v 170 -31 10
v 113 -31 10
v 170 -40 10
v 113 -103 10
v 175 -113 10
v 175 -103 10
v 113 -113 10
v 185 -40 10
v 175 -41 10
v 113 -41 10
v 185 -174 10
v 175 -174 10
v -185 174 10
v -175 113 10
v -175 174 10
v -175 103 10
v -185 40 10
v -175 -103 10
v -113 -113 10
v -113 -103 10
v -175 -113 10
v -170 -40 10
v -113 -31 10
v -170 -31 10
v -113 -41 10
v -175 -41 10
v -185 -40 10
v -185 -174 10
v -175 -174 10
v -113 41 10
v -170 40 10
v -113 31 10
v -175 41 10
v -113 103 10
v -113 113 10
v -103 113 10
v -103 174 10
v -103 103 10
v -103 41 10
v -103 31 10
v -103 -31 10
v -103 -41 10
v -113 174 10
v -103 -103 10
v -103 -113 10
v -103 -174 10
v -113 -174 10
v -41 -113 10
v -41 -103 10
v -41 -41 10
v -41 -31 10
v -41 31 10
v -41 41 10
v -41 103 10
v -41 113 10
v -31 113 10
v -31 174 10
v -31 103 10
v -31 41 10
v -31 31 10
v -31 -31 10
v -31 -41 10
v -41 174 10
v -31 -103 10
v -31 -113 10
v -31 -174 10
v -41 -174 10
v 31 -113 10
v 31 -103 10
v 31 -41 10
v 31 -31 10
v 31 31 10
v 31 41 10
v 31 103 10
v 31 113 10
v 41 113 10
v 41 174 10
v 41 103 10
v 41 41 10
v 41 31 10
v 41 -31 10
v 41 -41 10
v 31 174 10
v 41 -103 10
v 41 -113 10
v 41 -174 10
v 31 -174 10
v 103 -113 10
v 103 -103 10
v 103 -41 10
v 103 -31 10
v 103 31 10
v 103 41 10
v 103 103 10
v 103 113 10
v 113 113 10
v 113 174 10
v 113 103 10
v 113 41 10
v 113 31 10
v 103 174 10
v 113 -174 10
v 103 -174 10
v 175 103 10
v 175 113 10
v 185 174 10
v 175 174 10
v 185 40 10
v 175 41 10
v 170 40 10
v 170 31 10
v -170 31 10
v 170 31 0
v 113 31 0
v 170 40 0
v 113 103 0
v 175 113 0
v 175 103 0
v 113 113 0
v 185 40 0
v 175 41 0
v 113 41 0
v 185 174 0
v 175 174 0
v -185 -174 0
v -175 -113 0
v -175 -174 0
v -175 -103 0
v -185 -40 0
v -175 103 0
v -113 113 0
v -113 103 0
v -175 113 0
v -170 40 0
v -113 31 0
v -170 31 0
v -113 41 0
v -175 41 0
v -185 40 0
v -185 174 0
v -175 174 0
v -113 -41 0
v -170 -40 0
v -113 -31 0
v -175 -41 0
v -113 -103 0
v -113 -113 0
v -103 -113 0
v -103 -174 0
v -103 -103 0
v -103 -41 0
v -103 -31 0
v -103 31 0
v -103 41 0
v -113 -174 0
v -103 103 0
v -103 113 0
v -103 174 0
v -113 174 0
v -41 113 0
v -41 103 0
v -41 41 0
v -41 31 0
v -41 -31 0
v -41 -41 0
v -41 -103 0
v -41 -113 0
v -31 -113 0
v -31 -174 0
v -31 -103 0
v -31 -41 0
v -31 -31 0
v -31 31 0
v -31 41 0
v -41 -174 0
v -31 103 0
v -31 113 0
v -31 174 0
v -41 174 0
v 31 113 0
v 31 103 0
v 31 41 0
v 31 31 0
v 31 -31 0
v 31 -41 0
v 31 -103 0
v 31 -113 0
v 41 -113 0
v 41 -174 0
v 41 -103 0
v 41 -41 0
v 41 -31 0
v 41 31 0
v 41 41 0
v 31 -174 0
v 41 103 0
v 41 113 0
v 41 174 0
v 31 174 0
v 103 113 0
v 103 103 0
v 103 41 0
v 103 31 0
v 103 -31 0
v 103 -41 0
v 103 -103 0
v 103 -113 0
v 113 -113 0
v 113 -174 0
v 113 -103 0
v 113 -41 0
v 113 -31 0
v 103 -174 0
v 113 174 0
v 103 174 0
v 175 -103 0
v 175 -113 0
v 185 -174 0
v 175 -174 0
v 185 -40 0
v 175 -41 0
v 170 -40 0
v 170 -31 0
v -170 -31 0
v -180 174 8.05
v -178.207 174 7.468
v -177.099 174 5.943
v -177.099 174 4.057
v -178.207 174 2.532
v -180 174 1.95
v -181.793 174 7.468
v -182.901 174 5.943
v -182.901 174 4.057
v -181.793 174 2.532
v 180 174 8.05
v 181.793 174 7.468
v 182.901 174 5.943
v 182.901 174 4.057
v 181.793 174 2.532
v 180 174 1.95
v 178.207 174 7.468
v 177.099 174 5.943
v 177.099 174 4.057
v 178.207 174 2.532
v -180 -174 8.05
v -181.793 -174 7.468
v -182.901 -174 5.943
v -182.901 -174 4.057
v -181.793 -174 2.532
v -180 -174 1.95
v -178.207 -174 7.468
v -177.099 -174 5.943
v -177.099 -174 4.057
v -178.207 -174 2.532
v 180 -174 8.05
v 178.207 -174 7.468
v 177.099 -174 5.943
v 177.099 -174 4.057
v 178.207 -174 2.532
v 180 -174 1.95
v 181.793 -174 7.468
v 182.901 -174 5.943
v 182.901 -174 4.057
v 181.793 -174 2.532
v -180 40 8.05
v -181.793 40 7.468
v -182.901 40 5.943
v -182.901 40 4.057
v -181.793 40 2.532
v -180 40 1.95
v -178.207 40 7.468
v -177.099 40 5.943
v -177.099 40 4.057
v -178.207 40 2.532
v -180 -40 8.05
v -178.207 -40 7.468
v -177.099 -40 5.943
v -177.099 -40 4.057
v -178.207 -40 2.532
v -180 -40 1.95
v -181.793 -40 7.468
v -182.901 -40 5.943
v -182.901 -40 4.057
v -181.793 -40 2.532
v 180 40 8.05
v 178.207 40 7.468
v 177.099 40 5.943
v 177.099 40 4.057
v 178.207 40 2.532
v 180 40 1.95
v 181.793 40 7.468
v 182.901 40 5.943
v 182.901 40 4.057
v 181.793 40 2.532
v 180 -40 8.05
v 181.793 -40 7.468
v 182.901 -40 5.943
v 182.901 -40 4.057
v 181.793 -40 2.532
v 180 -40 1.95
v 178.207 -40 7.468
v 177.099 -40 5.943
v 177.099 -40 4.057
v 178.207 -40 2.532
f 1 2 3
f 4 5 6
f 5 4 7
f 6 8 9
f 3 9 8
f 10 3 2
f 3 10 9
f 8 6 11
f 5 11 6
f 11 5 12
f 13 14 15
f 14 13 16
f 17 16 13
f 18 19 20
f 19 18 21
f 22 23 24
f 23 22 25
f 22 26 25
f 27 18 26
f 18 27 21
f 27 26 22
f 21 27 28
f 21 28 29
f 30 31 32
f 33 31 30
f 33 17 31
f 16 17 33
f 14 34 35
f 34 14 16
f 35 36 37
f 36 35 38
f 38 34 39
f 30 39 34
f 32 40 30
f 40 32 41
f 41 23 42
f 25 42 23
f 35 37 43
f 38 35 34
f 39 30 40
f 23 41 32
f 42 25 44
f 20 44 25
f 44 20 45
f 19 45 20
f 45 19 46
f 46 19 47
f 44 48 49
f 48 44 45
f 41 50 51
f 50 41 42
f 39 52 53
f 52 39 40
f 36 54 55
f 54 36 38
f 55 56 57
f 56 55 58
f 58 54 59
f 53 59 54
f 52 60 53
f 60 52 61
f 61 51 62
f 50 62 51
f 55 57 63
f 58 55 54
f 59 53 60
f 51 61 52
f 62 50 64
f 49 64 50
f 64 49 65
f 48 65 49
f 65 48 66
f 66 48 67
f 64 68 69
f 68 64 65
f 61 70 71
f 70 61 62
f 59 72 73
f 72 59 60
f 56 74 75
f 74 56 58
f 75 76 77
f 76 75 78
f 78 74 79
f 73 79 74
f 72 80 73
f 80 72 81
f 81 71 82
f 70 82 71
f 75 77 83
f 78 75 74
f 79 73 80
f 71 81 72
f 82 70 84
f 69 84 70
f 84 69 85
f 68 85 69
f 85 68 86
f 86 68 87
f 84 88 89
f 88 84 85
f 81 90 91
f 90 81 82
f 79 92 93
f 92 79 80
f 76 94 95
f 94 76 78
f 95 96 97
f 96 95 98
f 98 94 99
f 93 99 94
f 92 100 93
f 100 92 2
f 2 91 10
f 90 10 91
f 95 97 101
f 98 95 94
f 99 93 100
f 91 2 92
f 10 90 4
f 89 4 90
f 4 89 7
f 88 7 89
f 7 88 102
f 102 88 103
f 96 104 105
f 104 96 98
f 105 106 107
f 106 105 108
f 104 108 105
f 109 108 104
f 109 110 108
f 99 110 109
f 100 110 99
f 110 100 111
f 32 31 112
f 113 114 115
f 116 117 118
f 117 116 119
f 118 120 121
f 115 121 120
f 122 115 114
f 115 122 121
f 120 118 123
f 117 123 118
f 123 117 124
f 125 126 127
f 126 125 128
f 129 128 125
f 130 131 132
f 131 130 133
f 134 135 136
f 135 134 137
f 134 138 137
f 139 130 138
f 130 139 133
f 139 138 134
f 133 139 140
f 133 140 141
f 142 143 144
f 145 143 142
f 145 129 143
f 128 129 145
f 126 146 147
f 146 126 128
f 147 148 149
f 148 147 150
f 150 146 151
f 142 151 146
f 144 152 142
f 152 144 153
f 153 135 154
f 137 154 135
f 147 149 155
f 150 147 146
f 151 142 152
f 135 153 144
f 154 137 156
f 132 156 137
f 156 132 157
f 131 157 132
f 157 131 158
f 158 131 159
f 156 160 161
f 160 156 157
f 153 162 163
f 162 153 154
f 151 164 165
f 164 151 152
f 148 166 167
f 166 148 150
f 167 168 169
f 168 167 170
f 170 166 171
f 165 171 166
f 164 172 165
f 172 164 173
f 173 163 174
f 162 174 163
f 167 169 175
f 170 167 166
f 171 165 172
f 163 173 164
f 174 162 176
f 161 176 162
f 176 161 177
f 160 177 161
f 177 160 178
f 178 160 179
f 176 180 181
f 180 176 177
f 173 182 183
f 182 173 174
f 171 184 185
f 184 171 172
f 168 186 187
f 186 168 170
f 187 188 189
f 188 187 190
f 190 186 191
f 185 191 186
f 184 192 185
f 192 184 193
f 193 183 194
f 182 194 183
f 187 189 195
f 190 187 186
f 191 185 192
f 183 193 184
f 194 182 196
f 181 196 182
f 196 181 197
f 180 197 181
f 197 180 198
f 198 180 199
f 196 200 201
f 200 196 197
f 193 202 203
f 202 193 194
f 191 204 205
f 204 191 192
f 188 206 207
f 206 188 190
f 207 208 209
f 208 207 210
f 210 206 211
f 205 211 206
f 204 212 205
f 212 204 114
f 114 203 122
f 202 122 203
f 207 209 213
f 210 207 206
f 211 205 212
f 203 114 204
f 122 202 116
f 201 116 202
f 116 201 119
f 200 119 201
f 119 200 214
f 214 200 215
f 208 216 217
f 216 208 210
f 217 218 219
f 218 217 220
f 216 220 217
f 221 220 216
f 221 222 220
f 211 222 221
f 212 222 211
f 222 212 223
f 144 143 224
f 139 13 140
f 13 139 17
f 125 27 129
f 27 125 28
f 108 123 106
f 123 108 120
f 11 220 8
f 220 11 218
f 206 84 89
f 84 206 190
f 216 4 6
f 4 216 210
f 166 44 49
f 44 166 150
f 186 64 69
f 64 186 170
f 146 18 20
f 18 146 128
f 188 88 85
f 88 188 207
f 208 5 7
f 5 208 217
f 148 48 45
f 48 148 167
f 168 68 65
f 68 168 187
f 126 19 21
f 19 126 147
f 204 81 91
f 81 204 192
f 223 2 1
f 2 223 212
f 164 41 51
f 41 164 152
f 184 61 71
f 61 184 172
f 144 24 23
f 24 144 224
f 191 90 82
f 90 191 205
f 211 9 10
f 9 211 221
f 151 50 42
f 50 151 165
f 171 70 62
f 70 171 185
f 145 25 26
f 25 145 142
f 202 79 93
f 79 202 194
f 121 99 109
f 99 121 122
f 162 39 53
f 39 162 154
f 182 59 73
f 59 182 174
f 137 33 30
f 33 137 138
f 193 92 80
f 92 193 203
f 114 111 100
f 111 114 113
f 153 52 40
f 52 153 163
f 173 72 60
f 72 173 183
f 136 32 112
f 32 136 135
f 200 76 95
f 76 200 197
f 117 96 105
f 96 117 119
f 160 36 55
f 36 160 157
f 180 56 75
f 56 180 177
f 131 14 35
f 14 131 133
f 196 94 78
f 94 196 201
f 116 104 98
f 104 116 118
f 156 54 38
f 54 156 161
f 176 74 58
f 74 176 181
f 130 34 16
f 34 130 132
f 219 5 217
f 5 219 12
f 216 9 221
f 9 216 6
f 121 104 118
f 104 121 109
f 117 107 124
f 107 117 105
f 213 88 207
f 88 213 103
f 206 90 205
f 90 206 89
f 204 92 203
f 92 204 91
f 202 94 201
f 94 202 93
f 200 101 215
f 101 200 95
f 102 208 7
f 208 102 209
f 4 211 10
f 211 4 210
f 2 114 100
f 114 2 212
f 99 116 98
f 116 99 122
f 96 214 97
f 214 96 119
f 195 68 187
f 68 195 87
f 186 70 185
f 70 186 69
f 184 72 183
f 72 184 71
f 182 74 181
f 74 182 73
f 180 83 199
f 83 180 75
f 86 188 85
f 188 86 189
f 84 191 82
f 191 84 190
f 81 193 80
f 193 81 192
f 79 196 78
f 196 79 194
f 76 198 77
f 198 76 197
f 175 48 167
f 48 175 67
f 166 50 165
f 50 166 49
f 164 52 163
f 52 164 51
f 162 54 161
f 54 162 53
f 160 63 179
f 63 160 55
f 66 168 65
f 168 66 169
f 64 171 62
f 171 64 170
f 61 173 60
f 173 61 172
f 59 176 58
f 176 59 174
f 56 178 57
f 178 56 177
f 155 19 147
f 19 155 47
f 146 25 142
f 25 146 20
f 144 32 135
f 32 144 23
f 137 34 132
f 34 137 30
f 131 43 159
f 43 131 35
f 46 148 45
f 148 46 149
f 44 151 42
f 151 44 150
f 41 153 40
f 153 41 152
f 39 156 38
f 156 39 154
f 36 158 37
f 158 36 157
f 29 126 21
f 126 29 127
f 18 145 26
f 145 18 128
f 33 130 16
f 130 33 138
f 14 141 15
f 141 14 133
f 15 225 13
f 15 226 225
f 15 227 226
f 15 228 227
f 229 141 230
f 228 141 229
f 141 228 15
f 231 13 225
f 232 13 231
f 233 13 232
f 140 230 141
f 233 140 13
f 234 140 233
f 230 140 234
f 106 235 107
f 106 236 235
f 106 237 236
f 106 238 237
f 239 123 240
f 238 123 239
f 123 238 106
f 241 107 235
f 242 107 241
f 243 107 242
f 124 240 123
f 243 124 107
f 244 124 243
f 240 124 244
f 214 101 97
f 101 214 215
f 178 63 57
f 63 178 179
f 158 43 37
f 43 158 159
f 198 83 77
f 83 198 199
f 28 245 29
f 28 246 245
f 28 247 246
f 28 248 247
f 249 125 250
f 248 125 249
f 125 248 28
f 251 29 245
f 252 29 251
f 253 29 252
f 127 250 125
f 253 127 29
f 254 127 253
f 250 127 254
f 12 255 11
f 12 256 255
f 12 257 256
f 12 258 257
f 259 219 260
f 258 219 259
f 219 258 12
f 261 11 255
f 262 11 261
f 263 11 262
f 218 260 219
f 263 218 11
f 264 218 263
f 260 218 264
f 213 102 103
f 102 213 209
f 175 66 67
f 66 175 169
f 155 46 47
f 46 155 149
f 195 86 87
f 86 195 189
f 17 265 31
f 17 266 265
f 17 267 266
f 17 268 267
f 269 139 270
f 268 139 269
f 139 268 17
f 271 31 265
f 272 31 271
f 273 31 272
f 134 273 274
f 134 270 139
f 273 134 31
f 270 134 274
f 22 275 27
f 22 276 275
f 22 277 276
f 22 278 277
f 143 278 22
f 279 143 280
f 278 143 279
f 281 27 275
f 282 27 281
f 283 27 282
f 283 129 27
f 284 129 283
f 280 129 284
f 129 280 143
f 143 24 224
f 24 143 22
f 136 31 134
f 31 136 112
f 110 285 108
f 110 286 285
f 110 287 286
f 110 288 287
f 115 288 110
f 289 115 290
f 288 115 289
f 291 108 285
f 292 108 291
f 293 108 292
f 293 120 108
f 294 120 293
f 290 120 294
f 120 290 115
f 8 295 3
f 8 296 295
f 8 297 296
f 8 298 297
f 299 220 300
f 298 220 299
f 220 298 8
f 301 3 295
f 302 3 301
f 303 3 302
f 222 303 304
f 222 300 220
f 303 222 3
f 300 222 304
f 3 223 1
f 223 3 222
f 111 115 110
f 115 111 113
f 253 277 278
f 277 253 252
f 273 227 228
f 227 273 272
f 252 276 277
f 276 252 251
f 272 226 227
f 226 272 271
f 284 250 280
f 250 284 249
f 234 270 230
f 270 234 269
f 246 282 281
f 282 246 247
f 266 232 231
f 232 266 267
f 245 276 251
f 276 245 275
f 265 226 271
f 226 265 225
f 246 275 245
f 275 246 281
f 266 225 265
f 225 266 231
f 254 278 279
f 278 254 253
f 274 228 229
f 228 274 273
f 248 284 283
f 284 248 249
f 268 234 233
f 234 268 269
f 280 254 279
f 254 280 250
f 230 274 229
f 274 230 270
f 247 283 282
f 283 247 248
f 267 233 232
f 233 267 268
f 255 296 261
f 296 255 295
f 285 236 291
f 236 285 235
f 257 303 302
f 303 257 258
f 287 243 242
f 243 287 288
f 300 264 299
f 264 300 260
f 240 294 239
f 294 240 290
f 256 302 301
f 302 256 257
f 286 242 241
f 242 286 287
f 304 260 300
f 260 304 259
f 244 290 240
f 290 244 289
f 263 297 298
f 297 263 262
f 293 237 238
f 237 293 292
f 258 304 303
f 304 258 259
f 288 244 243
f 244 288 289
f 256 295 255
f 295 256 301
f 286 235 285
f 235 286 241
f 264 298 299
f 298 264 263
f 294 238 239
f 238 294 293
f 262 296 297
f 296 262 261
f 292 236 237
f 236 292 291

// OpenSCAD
rotate([0, 0, 90]) translate([0, 0, 5]) difference()
{
  union()
  {
    for(x = [-370 / 2 + 5:72:220])
    {
      translate([x, 0, 0]) cube([10, 370, 10], center = true);
    }

    for(y = [-370 / 2 + 5:72:220])
    {
      translate([0, y, 0]) cube([370, 10, 10], center = true);
    }
  }

  translate([364, 0, 0]) cube([380, 380, 20], center = true);
  translate([-364, 0, 0]) cube([380, 380, 20], center = true);

  translate([0, 220, 0]) cube([80, 100, 20], center = true);
  translate([0, -220, 0]) cube([80, 100, 20], center = true);

  translate([0, 180, 0]) rotate([0, 90, 0]) cylinder(h = 1000, d = 6.1, center = true);
  translate([0, -180, 0]) rotate([0, 90, 0]) cylinder(h = 1000, d = 6.1, center = true);
}
